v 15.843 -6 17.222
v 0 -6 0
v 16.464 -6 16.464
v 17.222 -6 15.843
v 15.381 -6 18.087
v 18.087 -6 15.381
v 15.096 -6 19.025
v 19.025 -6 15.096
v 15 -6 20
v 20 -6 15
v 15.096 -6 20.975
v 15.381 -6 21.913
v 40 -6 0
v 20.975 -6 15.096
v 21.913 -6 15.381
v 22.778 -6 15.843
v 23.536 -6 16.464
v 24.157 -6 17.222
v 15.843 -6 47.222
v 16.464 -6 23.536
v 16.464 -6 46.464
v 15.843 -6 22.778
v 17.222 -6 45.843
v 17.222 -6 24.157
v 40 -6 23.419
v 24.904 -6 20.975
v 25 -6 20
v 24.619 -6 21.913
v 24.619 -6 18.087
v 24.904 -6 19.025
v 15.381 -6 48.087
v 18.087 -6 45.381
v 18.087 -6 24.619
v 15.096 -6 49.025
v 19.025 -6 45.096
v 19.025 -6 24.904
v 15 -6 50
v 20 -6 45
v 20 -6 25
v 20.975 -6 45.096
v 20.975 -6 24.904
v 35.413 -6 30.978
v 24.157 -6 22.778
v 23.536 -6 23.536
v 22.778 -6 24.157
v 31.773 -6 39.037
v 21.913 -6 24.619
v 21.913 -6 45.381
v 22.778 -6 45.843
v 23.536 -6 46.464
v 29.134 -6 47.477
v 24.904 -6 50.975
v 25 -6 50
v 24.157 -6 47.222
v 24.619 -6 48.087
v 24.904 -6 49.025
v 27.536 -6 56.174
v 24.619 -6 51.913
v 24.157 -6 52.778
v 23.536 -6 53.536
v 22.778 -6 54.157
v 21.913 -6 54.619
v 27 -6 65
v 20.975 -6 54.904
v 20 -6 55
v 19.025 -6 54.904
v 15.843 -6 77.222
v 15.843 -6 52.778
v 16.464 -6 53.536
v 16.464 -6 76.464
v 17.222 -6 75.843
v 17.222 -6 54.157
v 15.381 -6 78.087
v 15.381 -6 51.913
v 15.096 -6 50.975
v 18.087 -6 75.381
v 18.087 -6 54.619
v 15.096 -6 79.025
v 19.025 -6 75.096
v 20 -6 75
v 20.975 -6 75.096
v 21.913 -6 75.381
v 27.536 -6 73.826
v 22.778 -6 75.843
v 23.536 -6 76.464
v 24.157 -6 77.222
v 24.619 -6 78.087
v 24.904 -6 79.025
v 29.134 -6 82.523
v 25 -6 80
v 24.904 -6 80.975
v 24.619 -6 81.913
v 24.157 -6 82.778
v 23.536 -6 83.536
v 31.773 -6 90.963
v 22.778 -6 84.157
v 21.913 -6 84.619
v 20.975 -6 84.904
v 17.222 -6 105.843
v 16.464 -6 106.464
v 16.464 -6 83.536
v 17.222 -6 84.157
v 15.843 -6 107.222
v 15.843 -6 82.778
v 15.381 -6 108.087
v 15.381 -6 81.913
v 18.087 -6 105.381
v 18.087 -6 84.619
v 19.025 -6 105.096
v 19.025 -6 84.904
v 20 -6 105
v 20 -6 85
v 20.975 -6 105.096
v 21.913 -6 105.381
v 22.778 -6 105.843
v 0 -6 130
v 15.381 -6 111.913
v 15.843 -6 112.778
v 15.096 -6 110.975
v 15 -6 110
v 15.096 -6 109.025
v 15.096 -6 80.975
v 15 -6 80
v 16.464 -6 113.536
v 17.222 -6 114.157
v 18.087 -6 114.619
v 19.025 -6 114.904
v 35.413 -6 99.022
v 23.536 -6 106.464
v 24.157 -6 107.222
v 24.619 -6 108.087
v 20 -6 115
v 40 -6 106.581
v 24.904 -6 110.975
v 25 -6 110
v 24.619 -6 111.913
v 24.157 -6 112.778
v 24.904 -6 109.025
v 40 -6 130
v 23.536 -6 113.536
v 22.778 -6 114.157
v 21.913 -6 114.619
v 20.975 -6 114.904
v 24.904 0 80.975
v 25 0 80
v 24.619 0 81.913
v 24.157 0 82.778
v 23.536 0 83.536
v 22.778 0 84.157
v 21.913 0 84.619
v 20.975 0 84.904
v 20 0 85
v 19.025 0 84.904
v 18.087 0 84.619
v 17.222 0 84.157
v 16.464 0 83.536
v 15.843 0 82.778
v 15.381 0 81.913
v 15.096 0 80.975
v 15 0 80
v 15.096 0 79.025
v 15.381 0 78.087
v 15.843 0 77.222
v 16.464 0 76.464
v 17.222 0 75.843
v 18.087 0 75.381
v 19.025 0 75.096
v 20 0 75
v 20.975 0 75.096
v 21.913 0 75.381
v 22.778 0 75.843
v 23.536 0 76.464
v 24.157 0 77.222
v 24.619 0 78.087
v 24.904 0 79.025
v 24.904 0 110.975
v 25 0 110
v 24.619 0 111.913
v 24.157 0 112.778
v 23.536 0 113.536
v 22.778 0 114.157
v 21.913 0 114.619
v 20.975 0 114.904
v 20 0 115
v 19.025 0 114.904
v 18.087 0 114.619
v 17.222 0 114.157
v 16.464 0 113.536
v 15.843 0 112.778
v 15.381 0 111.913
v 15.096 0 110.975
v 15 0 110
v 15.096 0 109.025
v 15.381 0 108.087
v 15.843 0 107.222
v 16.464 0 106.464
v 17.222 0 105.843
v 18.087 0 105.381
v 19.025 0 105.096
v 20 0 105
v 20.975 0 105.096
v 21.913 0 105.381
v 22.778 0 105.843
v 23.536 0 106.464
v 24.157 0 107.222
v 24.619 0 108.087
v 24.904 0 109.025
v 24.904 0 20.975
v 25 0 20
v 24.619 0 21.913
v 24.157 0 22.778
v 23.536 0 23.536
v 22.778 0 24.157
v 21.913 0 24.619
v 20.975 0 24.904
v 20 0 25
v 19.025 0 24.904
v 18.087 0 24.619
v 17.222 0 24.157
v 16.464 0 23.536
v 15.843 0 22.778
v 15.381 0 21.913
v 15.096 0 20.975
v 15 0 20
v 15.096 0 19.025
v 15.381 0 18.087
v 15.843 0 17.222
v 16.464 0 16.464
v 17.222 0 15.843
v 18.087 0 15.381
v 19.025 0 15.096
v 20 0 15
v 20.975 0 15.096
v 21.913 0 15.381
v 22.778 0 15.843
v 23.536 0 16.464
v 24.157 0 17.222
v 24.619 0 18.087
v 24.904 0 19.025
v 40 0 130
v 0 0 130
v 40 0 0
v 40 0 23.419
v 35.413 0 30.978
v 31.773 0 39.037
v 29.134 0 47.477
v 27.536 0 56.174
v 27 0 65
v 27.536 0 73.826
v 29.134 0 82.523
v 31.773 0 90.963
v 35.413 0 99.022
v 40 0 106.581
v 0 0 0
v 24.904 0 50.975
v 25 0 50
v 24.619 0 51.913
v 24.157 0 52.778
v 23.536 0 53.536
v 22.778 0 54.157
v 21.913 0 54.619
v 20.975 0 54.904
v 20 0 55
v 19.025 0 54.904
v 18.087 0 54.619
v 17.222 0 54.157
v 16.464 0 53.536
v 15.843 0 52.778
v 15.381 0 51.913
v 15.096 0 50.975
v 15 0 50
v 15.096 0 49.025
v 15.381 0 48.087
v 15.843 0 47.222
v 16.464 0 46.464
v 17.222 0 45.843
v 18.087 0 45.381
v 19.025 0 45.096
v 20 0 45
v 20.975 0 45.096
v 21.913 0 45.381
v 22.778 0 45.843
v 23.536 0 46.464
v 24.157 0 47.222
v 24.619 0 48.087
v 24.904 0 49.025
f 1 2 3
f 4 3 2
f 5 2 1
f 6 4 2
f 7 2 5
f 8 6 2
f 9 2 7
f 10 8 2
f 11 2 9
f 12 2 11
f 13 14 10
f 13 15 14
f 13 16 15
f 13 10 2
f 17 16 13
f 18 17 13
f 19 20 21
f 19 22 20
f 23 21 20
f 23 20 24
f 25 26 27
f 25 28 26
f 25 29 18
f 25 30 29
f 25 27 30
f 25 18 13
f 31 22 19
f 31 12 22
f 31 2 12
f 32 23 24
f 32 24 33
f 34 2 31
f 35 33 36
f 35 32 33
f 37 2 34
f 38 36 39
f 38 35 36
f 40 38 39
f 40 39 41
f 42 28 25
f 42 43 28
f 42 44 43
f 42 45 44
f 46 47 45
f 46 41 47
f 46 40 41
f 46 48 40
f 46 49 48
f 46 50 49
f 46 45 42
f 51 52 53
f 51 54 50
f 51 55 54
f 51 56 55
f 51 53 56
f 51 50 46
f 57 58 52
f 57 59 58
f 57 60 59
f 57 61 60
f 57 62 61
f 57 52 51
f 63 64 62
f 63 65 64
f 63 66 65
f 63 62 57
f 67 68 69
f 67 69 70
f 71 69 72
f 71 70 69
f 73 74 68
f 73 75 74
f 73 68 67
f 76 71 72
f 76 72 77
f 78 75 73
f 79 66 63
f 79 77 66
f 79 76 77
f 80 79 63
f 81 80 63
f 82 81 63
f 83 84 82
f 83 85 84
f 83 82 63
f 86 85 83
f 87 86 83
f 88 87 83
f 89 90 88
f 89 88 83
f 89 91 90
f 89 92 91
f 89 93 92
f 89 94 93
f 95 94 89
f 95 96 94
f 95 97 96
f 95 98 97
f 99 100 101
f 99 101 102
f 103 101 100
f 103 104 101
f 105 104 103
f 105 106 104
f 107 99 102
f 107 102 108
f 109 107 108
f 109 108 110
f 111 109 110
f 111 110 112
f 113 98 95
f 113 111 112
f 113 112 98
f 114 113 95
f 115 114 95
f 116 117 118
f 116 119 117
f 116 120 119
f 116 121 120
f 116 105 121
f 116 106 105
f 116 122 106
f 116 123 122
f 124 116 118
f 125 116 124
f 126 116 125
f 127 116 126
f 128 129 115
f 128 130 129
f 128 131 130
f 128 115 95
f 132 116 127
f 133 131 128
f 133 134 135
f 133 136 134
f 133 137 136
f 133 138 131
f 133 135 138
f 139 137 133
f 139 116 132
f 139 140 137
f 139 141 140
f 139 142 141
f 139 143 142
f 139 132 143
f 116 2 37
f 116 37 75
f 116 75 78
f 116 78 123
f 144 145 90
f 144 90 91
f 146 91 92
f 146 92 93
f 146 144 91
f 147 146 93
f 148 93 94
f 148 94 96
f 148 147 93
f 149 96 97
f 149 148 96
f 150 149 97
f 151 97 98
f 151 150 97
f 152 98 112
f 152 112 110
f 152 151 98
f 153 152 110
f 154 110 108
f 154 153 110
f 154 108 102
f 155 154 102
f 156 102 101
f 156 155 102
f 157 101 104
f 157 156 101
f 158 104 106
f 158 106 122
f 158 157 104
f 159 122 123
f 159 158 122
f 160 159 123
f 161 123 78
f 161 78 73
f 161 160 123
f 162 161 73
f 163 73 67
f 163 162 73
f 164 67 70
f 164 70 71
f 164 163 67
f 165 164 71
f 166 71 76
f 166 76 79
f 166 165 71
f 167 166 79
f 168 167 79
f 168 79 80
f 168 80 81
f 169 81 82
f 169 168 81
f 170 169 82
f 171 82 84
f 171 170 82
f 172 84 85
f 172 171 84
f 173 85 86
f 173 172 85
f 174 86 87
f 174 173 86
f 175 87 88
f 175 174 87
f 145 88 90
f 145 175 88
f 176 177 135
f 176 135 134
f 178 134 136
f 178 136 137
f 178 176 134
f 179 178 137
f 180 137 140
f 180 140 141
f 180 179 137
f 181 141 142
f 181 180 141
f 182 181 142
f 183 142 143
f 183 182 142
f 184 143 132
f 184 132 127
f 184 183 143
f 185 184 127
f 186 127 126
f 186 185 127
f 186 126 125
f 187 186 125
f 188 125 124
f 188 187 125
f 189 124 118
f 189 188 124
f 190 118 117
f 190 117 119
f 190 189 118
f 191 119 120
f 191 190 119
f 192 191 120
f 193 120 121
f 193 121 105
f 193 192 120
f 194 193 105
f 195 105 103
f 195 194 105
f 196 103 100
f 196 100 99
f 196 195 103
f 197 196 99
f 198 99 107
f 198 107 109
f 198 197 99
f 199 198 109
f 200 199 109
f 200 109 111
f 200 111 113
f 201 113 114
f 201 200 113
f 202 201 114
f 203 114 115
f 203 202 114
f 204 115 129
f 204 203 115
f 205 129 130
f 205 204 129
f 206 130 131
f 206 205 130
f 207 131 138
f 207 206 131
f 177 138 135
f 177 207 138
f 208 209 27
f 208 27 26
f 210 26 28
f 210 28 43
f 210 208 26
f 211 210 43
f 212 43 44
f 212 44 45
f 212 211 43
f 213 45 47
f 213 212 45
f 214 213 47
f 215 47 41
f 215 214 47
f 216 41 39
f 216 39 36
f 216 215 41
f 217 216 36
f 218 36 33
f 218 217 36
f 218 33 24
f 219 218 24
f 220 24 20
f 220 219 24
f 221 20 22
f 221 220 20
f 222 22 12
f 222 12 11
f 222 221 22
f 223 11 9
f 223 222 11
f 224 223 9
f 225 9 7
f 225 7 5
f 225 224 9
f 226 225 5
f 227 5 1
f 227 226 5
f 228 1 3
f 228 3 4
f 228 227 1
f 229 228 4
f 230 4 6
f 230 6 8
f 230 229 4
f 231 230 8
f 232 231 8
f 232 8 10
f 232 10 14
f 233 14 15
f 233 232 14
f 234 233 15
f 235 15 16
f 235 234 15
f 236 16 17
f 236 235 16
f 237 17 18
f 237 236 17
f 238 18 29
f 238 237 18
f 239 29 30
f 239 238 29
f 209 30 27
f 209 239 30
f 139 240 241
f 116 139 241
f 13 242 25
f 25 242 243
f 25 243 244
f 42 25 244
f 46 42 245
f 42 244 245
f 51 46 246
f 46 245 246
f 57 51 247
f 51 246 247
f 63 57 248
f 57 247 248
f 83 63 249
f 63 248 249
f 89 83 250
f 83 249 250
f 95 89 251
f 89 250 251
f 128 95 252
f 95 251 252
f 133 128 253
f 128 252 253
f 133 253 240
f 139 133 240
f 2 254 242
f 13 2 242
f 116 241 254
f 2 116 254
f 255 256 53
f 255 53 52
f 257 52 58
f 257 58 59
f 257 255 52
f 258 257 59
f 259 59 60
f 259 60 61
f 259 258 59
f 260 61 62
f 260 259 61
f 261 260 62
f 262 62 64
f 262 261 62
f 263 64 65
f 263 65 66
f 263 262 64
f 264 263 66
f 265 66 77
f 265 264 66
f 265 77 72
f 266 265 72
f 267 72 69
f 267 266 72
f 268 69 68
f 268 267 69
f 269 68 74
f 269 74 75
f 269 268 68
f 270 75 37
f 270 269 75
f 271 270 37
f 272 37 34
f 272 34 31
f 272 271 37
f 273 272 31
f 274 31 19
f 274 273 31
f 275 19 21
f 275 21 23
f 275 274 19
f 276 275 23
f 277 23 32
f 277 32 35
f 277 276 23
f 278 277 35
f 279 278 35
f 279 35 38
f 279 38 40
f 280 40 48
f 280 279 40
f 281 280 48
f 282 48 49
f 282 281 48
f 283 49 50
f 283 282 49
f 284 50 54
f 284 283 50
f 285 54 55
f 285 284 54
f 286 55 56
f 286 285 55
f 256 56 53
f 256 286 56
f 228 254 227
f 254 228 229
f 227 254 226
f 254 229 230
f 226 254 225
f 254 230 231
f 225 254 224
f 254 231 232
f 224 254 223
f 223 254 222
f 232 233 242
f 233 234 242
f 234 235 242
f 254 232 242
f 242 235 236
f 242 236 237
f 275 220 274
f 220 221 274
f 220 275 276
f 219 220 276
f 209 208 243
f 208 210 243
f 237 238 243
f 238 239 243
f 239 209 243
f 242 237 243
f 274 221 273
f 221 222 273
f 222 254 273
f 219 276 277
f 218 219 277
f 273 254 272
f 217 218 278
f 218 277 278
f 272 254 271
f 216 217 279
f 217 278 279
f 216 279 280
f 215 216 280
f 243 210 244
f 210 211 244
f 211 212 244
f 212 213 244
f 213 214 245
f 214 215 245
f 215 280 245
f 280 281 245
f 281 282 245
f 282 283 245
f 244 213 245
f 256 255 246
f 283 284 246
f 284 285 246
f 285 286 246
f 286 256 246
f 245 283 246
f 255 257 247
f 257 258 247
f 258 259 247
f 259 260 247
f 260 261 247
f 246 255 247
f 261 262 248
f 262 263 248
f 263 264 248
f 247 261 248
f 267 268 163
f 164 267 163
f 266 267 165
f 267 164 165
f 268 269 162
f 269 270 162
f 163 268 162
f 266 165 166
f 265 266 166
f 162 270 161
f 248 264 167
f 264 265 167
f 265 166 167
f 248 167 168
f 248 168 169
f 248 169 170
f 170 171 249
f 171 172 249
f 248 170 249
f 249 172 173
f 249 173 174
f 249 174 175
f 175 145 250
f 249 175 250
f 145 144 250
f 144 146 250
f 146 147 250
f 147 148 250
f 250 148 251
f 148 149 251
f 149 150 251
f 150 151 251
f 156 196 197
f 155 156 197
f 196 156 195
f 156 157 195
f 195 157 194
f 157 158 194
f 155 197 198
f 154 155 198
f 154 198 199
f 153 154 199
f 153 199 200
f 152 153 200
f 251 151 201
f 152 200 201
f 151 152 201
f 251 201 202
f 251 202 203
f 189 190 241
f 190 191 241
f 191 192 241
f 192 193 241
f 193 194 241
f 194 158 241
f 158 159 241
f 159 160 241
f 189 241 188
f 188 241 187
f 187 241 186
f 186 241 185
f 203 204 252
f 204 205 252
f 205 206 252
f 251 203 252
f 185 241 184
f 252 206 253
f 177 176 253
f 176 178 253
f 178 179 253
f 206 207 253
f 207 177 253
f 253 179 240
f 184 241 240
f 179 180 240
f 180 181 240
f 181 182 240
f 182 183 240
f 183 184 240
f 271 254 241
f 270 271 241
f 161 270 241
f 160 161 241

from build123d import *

# Parameters (mm, degrees)
F0_R     = 5
F1_DEPTH = 6


# Not quite as in the source:
# - a feature names something its author has since deleted; it is built from what else it names


with BuildPart() as f1:
    # F0 (on Front) → F1 (new body)
    with BuildSketch(Plane.XZ):
        with BuildLine():
            Line((0, 130), (0, 0))
            Line((0, 0), (40, 0))
            Line((40, 0), (40, 23.4187542274))
            ThreePointArc((40, 23.4187542274), (27, 65), (40, 106.5812457726))
            Line((40, 106.5812457726), (40, 130))
            Line((40, 130), (35, 130))
            Line((35, 130), (0, 130))
        make_face()
        with Locations((20, 20)):
            Circle(F0_R, mode=Mode.SUBTRACT)
        with Locations((20, 50)):
            Circle(F0_R, mode=Mode.SUBTRACT)
        with Locations((20, 80)):
            Circle(F0_R, mode=Mode.SUBTRACT)
        with Locations((20, 110)):
            Circle(F0_R, mode=Mode.SUBTRACT)
    extrude(amount=F1_DEPTH)


solid = f1.part
